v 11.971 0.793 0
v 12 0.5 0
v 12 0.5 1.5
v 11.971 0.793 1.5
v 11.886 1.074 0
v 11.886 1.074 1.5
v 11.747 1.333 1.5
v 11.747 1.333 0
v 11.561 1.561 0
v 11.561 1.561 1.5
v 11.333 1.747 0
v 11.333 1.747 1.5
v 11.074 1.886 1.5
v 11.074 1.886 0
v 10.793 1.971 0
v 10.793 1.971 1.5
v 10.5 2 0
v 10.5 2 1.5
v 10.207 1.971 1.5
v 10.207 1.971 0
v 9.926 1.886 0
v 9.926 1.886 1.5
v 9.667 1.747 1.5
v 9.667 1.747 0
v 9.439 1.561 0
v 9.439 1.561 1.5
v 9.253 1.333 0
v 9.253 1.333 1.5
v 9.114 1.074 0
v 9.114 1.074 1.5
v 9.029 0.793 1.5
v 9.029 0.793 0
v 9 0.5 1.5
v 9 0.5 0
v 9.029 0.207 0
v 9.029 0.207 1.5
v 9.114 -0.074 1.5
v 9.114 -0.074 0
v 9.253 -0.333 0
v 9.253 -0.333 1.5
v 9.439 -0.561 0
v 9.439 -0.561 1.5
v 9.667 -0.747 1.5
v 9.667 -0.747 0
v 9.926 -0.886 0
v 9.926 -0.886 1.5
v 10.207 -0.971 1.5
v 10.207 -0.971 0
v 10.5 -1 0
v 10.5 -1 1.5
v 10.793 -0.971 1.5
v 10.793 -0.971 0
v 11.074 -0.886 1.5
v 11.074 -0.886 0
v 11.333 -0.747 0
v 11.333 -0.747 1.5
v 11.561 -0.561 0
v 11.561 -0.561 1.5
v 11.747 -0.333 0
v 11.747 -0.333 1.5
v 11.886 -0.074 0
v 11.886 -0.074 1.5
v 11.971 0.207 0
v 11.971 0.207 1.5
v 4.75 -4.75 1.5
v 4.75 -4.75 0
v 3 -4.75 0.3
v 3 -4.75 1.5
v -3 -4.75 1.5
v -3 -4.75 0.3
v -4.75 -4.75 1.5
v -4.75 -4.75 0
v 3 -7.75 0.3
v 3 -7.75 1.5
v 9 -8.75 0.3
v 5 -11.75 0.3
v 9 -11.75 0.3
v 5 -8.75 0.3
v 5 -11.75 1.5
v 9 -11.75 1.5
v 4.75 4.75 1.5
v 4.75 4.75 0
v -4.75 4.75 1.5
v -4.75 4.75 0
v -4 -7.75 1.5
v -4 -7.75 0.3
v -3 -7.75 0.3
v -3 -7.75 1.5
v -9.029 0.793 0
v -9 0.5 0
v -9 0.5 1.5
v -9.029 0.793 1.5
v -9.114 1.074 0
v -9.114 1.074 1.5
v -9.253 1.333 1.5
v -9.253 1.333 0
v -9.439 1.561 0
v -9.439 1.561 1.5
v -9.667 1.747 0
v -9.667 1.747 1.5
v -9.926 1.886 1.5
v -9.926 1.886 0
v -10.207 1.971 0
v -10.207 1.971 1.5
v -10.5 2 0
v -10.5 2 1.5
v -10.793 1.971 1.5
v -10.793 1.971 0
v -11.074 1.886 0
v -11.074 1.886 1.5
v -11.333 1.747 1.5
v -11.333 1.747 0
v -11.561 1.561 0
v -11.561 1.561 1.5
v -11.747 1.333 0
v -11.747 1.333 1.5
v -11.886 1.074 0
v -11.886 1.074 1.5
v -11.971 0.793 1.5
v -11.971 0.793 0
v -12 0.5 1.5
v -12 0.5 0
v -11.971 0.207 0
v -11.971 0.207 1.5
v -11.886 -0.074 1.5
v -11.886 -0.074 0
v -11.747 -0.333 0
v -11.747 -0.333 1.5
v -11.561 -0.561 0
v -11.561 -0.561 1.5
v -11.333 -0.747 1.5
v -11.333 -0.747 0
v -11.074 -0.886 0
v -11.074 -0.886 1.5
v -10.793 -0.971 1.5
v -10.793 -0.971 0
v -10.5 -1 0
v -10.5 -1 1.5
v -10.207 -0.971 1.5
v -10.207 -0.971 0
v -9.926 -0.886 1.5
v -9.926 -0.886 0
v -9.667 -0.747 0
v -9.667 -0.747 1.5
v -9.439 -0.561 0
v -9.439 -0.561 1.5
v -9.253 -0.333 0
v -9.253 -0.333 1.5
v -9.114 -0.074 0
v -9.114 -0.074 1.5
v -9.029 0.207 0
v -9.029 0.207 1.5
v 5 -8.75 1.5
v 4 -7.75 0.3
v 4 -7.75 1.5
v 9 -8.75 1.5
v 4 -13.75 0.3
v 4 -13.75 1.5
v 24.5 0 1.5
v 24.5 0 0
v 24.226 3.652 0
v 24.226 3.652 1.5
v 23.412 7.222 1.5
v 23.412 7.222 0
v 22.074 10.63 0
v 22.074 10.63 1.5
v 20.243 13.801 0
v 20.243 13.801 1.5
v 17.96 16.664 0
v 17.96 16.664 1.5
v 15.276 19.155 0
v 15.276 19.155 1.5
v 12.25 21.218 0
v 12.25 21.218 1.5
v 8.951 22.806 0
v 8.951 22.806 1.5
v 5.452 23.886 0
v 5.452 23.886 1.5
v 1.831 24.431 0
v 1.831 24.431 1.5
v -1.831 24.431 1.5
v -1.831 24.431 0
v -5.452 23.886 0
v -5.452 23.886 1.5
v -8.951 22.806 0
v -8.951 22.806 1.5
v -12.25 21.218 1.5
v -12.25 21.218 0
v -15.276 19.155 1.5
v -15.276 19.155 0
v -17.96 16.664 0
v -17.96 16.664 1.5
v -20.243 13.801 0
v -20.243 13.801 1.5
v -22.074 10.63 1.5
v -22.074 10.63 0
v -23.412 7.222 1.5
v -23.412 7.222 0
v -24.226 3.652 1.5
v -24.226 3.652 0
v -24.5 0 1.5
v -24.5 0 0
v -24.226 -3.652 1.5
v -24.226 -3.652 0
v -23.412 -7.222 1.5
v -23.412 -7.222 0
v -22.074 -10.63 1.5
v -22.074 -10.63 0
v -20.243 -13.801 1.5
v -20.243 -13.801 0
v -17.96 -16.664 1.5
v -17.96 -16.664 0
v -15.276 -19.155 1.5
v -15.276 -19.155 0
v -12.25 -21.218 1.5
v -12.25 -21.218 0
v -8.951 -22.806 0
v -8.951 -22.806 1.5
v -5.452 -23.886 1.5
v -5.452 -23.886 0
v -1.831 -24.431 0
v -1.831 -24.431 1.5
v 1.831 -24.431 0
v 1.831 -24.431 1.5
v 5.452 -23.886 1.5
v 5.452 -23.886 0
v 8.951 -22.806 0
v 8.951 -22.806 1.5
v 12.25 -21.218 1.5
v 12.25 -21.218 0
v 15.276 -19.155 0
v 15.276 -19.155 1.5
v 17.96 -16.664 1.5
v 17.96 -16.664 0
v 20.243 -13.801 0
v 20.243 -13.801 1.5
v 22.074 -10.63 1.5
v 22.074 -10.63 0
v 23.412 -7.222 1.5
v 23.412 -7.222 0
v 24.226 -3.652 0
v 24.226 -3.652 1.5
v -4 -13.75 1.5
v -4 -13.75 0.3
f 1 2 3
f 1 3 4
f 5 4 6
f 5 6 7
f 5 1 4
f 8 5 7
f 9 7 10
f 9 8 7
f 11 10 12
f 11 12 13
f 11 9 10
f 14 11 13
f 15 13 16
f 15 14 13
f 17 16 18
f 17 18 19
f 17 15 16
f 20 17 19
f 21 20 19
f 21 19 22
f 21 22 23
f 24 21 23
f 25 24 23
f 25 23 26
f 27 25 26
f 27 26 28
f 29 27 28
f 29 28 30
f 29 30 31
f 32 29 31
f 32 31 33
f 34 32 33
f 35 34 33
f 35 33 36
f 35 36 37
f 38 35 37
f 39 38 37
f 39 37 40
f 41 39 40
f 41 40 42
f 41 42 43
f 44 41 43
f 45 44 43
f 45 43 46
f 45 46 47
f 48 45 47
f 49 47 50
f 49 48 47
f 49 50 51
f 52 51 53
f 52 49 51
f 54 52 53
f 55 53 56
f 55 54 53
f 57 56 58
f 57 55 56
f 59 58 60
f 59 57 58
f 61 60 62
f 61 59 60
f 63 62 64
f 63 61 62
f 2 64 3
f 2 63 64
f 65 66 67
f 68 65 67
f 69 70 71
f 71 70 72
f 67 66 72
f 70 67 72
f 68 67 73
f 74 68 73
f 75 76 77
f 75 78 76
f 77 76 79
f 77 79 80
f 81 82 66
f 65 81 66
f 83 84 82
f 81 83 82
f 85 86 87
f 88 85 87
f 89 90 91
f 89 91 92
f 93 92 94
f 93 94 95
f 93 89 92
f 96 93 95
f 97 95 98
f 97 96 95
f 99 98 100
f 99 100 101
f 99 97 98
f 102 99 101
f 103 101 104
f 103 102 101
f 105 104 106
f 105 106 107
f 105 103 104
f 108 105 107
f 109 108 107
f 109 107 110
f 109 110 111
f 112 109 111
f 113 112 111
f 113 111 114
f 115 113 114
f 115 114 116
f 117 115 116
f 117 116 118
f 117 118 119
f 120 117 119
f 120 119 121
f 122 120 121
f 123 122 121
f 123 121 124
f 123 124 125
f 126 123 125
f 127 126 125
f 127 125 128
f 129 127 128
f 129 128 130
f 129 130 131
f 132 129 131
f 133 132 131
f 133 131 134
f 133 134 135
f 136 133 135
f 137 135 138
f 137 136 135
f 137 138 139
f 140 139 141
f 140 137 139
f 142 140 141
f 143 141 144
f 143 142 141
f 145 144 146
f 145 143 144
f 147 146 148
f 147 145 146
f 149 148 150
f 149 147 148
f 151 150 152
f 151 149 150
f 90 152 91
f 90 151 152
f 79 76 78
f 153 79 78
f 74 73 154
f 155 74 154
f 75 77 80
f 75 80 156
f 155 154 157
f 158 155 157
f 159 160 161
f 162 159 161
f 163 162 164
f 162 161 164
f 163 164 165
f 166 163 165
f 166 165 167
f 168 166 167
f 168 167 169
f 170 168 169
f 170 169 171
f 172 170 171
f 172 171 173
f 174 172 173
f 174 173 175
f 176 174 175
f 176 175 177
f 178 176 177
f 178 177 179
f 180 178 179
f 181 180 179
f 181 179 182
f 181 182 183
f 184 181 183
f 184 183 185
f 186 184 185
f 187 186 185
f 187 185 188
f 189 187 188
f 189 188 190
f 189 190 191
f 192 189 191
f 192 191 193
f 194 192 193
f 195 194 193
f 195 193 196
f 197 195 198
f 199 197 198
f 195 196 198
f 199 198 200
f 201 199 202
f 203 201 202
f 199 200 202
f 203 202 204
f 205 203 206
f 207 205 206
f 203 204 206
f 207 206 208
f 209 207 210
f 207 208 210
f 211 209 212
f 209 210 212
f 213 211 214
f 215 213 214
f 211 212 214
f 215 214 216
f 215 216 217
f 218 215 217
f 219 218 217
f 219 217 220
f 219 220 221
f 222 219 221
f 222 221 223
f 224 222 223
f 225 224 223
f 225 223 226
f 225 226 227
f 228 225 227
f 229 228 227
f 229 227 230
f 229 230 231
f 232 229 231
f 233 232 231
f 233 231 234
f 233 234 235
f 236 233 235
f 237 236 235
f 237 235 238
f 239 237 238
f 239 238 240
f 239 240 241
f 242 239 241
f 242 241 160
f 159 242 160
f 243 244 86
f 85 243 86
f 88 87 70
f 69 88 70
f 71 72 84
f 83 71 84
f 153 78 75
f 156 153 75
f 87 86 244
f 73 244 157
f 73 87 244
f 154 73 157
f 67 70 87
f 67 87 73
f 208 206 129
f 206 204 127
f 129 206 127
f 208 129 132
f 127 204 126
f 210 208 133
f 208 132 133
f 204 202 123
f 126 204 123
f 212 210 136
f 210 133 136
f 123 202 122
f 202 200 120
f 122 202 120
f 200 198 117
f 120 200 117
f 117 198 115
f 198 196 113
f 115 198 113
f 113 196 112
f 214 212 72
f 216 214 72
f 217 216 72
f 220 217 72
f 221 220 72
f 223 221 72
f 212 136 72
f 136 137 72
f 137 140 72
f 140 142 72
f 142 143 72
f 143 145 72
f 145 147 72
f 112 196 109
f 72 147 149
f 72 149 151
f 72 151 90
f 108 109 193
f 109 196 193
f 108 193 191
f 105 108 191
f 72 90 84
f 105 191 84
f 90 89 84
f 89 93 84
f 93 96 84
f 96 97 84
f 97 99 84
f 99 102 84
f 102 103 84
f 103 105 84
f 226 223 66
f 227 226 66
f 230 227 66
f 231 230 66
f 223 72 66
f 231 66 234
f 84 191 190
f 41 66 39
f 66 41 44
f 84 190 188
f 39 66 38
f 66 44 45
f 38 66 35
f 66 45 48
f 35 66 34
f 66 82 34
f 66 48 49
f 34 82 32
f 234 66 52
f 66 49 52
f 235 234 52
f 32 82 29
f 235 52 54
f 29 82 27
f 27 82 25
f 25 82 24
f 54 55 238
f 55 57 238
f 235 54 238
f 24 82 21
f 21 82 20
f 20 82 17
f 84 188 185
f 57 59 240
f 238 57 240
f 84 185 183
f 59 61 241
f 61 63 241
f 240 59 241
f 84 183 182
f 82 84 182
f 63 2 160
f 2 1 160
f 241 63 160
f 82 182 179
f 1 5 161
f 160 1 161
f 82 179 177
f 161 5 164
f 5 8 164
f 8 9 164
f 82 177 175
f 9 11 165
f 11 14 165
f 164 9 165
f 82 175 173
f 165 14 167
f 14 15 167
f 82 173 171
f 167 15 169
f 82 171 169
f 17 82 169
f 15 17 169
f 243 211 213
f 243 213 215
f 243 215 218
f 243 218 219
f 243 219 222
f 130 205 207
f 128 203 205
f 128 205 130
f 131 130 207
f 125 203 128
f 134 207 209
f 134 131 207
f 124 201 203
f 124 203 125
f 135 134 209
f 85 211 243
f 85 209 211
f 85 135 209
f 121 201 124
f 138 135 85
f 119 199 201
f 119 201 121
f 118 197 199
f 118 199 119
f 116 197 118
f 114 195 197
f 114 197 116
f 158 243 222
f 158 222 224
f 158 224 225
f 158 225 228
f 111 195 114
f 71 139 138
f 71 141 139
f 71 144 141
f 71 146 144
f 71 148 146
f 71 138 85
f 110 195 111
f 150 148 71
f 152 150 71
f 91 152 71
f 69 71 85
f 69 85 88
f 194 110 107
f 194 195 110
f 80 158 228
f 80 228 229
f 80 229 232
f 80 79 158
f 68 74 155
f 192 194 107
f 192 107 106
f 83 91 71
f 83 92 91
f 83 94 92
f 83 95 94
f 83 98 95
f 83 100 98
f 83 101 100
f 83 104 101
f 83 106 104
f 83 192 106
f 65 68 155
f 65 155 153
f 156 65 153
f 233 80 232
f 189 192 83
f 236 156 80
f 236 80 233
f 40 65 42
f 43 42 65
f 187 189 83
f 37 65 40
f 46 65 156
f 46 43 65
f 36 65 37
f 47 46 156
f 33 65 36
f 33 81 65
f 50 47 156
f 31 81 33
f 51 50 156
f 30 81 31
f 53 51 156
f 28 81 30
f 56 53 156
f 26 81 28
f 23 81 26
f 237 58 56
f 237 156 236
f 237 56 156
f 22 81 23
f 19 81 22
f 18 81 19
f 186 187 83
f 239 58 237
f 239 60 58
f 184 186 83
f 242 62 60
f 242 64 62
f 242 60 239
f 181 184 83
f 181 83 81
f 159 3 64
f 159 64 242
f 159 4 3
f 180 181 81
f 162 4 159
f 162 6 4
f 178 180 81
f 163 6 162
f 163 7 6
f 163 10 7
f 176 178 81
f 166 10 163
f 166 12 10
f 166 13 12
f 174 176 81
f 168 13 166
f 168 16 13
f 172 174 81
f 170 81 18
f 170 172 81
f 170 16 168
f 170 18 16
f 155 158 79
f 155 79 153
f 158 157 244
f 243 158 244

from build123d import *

# Parameters (mm, degrees)
F0_R     = 24.5
F0_W     = 4
F0_H     = 3
F0_R_2   = 1.5
F0_W_2   = 6
F1_DEPTH = 0.3
F2_DEPTH = 1.5


with BuildPart() as f1:
    # F0 (on Top) → F1 (new body)
    with BuildSketch(Plane.XY):
        Circle(F0_R)
        Polygon((-4.75, -4.75), (-4.75, 4.75), (4.75, 4.75), (4.75, -4.75), (3, -4.75), (3, -7.75), (4, -7.75), (4, -13.75), (-4, -13.75), (-4, -7.75), (-3, -7.75), (-3, -4.75), align=None, mode=Mode.SUBTRACT)
        with Locations((7, -10.25)):
            Rectangle(F0_W, F0_H, mode=Mode.SUBTRACT)
        with Locations((-10.5, 0.5)):
            Circle(F0_R_2, mode=Mode.SUBTRACT)
        with Locations((10.5, 0.5)):
            Circle(F0_R_2, mode=Mode.SUBTRACT)
        with Locations((7, -10.25)):
            Rectangle(F0_W, F0_H)
        Polygon((3, -7.75), (-3, -7.75), (-4, -7.75), (-4, -13.75), (4, -13.75), (4, -7.75), align=None)
        with Locations((0, -6.25)):
            Rectangle(F0_W_2, F0_H)
    extrude(amount=F1_DEPTH)

    # F0 (on Top) → F2 (join)
    with BuildSketch(Plane.XY):
        Circle(F0_R)
        Polygon((-4.75, -4.75), (-4.75, 4.75), (4.75, 4.75), (4.75, -4.75), (3, -4.75), (3, -7.75), (4, -7.75), (4, -13.75), (-4, -13.75), (-4, -7.75), (-3, -7.75), (-3, -4.75), align=None, mode=Mode.SUBTRACT)
        with Locations((7, -10.25)):
            Rectangle(F0_W, F0_H, mode=Mode.SUBTRACT)
        with Locations((-10.5, 0.5)):
            Circle(F0_R_2, mode=Mode.SUBTRACT)
        with Locations((10.5, 0.5)):
            Circle(F0_R_2, mode=Mode.SUBTRACT)
    extrude(amount=F2_DEPTH)


solid = f1.part
